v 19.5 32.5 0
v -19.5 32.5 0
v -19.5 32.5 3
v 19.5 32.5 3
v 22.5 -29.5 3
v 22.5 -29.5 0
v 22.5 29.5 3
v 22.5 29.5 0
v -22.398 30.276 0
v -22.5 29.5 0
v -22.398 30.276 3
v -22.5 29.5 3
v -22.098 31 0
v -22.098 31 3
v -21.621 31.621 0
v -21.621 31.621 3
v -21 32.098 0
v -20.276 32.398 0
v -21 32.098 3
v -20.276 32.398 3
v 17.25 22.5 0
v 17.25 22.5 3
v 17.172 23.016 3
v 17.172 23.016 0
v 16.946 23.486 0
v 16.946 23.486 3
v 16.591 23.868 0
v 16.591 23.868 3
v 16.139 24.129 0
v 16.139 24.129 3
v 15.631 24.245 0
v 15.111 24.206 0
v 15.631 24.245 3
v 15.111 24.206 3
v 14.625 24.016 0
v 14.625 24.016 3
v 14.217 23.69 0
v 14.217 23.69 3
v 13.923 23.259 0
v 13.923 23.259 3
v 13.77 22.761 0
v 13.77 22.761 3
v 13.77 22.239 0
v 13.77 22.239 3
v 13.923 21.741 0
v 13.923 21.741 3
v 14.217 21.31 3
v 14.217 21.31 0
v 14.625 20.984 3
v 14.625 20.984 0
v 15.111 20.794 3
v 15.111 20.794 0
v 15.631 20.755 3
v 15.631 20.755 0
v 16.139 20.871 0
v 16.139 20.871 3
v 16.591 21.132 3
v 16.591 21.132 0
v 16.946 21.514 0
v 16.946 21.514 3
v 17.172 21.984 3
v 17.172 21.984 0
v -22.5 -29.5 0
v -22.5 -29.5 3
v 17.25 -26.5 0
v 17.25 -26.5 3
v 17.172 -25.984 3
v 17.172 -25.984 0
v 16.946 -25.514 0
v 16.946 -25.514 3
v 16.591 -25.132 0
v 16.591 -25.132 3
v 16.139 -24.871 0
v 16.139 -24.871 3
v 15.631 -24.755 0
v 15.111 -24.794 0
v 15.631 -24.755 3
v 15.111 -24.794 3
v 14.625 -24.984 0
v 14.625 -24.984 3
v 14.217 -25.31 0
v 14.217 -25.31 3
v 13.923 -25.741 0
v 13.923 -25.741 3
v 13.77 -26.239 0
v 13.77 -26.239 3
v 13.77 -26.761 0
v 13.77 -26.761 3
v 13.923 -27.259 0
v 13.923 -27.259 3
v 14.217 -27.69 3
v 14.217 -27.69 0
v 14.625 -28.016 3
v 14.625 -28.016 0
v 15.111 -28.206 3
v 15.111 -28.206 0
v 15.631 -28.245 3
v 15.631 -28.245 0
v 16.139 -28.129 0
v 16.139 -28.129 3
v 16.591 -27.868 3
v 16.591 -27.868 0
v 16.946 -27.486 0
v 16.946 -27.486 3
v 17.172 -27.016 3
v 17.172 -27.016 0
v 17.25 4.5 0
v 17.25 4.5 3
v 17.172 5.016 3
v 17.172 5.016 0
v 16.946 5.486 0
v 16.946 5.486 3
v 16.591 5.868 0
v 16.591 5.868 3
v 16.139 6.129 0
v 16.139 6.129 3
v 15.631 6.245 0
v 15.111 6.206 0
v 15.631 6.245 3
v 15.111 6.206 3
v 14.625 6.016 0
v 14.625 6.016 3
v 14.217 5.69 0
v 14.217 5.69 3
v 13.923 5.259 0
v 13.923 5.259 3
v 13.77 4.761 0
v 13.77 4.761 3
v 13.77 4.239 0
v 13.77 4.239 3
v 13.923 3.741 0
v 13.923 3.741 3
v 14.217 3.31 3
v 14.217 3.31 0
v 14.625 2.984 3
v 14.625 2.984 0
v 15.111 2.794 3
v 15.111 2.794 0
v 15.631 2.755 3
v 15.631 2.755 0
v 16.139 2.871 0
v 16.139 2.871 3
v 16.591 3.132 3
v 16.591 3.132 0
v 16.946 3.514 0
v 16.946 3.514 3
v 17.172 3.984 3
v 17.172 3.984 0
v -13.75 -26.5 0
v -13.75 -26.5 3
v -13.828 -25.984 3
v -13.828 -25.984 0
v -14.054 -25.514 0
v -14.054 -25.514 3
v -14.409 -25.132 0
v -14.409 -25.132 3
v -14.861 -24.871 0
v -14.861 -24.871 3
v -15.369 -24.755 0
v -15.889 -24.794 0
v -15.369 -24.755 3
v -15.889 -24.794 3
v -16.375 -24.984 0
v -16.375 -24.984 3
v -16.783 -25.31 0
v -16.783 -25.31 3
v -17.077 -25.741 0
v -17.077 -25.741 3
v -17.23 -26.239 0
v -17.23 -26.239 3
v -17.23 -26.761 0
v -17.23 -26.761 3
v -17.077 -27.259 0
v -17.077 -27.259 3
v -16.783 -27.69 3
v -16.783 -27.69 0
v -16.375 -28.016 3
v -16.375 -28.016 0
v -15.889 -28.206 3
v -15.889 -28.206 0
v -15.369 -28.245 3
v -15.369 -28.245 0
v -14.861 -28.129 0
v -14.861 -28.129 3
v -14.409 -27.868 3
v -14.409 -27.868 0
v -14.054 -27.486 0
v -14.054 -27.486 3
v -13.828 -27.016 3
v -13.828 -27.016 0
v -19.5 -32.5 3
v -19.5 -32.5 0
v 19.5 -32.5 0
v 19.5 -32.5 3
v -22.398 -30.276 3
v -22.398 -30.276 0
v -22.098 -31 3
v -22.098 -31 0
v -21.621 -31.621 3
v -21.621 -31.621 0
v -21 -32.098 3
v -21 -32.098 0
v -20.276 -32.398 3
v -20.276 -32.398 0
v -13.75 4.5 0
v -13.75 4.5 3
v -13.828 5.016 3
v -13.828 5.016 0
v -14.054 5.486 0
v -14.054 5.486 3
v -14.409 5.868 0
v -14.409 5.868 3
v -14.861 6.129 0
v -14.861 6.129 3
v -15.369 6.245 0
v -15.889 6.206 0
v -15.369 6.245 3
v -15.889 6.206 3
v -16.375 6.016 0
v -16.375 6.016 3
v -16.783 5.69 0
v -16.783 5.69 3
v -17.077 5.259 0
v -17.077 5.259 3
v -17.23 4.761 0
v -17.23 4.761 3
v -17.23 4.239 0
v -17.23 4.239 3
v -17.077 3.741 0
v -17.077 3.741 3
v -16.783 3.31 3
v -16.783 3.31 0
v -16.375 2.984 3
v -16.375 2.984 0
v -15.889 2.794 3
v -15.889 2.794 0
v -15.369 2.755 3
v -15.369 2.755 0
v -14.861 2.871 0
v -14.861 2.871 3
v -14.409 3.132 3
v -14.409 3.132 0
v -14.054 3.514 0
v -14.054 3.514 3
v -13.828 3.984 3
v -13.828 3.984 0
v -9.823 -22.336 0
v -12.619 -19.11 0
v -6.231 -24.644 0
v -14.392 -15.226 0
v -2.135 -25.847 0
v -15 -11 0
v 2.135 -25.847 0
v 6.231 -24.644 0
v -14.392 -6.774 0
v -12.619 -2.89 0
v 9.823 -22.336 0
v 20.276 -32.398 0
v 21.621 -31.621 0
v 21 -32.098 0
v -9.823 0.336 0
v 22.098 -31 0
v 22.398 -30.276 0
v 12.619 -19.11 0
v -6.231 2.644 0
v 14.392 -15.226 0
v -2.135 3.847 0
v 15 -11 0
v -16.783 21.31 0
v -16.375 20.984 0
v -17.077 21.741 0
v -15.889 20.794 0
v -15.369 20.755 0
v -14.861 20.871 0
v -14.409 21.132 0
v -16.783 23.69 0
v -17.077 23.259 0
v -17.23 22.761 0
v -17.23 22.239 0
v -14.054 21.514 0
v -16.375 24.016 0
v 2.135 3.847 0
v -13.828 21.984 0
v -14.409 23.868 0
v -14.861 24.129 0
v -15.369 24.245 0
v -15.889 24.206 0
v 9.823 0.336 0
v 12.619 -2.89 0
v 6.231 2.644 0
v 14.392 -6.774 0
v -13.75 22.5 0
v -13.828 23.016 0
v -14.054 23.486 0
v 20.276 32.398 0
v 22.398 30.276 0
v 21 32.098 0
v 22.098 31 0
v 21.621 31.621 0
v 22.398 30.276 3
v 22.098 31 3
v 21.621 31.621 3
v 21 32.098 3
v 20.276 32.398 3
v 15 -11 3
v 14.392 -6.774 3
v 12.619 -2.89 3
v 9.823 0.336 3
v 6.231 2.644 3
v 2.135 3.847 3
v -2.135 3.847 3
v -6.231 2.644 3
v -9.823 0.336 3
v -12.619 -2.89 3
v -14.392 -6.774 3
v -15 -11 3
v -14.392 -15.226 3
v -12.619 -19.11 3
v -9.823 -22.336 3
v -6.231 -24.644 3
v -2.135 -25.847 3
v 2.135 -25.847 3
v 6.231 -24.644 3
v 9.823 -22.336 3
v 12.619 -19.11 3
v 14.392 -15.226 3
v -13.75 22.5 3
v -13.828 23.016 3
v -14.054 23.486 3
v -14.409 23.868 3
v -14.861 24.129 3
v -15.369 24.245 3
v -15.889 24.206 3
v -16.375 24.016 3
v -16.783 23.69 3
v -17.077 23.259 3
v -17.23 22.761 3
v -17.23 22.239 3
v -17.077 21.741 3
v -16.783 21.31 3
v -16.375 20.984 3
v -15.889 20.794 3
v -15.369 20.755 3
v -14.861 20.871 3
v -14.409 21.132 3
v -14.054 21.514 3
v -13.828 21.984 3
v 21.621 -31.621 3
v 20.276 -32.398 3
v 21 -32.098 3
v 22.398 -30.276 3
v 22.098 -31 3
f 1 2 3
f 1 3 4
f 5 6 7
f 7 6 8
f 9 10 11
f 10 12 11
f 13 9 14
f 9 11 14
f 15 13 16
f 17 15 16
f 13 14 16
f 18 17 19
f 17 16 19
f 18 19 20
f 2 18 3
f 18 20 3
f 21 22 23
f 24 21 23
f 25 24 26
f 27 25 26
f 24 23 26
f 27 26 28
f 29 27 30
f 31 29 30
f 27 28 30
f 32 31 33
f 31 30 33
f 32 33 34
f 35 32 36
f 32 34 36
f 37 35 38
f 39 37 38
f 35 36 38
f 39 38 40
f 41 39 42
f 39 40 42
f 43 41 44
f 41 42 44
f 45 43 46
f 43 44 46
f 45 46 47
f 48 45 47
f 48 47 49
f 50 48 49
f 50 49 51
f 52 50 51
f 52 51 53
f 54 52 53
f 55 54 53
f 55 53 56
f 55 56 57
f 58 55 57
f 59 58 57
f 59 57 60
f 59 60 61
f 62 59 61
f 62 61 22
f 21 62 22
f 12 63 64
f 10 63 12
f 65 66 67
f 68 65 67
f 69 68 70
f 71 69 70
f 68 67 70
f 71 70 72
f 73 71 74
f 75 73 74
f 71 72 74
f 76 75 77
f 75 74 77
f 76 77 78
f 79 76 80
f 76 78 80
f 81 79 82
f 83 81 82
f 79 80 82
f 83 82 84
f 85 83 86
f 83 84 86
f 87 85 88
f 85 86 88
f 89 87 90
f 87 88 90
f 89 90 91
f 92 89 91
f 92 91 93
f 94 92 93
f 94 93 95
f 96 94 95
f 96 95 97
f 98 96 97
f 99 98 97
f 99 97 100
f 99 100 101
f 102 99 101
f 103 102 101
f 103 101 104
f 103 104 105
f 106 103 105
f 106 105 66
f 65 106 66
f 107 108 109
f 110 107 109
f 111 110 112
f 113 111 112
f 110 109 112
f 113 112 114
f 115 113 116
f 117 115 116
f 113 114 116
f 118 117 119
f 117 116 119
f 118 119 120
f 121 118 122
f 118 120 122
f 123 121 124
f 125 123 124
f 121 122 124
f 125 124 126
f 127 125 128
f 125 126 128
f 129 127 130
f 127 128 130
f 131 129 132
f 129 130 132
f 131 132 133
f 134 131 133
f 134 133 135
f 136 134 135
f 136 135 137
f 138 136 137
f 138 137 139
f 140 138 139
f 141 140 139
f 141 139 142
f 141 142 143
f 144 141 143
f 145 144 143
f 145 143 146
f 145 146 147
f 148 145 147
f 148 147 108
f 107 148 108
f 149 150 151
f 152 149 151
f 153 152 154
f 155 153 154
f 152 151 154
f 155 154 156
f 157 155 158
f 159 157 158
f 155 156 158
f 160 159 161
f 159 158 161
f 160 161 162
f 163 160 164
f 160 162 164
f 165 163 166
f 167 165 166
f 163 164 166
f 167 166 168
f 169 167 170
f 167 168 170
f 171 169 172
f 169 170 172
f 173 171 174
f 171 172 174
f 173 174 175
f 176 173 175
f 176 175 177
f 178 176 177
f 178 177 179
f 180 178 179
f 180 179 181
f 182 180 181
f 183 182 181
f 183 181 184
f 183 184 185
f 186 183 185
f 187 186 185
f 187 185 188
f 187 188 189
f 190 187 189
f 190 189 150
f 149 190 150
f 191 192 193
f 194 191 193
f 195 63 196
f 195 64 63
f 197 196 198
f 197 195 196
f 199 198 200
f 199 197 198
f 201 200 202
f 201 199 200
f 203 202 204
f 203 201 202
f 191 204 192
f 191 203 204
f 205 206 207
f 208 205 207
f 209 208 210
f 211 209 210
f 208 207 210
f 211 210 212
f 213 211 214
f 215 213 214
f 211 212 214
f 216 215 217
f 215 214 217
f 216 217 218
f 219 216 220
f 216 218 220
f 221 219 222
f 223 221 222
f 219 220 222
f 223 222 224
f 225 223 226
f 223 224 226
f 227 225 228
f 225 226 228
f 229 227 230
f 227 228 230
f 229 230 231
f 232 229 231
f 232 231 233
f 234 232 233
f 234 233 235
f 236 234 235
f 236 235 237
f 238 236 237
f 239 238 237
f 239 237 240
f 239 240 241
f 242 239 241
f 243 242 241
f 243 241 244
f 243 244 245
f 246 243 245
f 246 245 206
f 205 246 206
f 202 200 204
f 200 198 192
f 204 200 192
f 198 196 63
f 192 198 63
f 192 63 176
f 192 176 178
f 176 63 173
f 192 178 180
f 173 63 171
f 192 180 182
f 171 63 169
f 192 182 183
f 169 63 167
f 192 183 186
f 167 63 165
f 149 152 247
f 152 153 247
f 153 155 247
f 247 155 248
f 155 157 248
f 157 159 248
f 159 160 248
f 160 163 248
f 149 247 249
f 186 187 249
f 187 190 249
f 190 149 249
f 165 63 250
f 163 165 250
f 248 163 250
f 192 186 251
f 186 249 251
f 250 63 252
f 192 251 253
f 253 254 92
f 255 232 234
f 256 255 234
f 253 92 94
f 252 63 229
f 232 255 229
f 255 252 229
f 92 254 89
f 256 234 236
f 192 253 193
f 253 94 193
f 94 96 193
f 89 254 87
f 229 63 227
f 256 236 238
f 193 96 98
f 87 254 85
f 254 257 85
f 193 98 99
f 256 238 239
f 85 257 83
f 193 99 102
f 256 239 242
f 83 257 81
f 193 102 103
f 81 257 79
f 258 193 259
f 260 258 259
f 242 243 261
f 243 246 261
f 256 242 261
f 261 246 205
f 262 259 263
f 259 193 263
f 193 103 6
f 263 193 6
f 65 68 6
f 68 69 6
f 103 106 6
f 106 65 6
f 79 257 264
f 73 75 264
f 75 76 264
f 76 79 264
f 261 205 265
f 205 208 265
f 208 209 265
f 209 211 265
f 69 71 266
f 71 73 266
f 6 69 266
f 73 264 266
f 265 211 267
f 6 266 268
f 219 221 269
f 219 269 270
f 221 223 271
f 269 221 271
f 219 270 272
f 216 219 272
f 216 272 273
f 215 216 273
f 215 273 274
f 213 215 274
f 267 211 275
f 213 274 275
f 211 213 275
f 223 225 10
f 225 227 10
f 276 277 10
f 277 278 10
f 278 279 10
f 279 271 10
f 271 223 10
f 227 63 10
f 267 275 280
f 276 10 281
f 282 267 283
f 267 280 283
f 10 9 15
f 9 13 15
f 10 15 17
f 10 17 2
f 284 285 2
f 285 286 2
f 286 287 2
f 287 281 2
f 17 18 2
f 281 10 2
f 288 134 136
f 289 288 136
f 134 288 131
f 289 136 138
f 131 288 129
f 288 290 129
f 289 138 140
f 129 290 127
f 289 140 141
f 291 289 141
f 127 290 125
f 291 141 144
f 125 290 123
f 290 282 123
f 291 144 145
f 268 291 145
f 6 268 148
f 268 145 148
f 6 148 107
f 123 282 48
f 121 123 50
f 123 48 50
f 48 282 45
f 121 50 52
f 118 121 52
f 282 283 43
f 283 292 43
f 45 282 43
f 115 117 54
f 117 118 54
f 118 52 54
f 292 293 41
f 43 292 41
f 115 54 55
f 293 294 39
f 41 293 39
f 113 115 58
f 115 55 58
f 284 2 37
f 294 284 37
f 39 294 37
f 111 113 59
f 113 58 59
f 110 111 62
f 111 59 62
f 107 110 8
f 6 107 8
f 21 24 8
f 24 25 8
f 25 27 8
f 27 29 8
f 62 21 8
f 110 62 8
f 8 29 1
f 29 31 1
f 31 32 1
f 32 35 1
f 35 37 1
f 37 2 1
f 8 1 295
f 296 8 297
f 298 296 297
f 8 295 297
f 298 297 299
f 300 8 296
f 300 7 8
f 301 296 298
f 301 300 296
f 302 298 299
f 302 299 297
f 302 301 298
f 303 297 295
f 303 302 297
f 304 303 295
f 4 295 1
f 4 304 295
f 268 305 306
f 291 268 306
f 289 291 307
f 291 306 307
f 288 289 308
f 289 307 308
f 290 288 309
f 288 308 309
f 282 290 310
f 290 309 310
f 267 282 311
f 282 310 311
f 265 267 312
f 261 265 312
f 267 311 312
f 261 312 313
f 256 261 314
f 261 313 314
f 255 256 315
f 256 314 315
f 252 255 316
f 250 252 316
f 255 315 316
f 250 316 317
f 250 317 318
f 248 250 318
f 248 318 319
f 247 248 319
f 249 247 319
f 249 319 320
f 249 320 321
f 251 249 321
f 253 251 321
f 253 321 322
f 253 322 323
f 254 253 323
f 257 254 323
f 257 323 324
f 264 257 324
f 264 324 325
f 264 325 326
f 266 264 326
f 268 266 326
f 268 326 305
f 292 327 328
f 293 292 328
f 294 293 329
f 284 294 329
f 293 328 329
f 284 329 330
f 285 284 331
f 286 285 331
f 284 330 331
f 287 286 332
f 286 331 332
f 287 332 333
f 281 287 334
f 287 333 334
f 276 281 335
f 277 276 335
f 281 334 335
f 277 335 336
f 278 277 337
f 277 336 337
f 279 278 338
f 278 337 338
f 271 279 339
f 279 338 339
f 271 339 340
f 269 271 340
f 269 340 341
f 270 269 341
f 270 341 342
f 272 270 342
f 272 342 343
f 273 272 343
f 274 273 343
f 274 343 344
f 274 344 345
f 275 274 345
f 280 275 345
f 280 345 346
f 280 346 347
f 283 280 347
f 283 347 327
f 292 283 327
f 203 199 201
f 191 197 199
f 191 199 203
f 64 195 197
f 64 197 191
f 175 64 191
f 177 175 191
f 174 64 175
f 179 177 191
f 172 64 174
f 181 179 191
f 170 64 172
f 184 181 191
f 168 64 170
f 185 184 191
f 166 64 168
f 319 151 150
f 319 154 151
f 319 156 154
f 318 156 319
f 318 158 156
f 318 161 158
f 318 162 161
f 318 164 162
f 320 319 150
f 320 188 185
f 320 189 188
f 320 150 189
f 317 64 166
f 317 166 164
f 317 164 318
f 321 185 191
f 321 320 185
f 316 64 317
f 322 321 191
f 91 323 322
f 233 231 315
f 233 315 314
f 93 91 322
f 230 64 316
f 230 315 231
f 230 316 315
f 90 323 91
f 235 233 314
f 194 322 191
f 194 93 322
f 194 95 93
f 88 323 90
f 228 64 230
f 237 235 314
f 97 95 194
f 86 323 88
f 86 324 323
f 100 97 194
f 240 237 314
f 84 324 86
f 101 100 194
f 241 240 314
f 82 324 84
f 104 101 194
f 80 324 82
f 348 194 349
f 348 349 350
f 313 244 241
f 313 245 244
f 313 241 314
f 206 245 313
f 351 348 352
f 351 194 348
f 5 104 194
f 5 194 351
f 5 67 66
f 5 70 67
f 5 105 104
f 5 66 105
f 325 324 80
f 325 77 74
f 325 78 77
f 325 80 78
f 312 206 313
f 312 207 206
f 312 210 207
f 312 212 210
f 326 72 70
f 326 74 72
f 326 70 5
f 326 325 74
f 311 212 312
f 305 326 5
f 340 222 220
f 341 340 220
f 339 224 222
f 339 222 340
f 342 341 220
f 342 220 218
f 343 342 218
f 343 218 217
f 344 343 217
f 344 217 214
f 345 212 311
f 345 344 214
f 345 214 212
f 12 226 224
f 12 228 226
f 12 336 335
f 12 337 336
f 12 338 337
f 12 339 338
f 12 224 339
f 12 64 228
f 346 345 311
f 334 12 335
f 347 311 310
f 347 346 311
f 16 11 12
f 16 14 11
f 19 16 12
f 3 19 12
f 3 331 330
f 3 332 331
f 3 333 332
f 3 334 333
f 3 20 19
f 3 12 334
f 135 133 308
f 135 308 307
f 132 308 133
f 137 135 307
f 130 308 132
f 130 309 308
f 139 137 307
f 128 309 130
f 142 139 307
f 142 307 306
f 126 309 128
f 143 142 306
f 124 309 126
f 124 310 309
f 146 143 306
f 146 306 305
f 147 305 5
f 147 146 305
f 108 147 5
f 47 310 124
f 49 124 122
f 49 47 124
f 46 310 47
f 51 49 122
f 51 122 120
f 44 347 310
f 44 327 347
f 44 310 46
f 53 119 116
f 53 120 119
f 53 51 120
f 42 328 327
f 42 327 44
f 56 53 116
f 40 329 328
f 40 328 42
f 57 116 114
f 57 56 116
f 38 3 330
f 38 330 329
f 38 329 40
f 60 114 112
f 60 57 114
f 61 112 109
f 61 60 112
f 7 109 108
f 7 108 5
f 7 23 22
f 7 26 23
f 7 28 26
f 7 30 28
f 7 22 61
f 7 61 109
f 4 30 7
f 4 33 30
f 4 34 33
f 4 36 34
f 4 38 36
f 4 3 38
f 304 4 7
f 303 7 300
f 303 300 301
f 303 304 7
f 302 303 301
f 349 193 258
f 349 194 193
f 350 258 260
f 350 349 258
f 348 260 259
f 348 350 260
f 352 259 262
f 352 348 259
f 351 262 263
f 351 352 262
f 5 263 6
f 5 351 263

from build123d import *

# Parameters (mm, degrees)
SKIZZE1_W                       = 45
SKIZZE1_H                       = 65
AUFSATZ_LINEAR_AUSTRAGEN1_DEPTH = 3
VERRUNDUNG1_R                   = 3
SKIZZE2_R                       = 1.75
SKIZZE2_R_2                     = 15
SCHNITT_LINEAR_AUSTRAGEN1_DEPTH = 12


with BuildPart() as part:
    # Skizze1 → Aufsatz-Linear austragen1 (new body)
    with BuildSketch(Plane.XY):
        Rectangle(SKIZZE1_W, SKIZZE1_H)
    extrude(amount=AUFSATZ_LINEAR_AUSTRAGEN1_DEPTH)

    # Verrundung1
    verrundung1_edges = [part.edges().sort_by_distance(p)[0] for p in [
        (-22.5, 32.5, 1.5),
        (22.5, 32.5, 1.5),
        (22.5, -32.5, 1.5),
        (-22.5, -32.5, 1.5),
    ]]
    fillet(verrundung1_edges, radius=VERRUNDUNG1_R)

    # Skizze2 → Schnitt-Linear austragen1 (cut)
    with BuildSketch(Plane.XY.offset(3)):
        with Locations((-15.5, -26.5)):
            Circle(SKIZZE2_R)
        with Locations((-15.5, 4.5)):
            Circle(SKIZZE2_R)
        with Locations((15.5, 4.5)):
            Circle(SKIZZE2_R)
        with Locations((15.5, -26.5)):
            Circle(SKIZZE2_R)
        with Locations((15.5, 22.5)):
            Circle(SKIZZE2_R)
        with Locations((-15.5, 22.5)):
            Circle(SKIZZE2_R)
        with Locations((0, -11)):
            Circle(SKIZZE2_R_2)
    extrude(amount=-SCHNITT_LINEAR_AUSTRAGEN1_DEPTH, mode=Mode.SUBTRACT)


solid = part.part
